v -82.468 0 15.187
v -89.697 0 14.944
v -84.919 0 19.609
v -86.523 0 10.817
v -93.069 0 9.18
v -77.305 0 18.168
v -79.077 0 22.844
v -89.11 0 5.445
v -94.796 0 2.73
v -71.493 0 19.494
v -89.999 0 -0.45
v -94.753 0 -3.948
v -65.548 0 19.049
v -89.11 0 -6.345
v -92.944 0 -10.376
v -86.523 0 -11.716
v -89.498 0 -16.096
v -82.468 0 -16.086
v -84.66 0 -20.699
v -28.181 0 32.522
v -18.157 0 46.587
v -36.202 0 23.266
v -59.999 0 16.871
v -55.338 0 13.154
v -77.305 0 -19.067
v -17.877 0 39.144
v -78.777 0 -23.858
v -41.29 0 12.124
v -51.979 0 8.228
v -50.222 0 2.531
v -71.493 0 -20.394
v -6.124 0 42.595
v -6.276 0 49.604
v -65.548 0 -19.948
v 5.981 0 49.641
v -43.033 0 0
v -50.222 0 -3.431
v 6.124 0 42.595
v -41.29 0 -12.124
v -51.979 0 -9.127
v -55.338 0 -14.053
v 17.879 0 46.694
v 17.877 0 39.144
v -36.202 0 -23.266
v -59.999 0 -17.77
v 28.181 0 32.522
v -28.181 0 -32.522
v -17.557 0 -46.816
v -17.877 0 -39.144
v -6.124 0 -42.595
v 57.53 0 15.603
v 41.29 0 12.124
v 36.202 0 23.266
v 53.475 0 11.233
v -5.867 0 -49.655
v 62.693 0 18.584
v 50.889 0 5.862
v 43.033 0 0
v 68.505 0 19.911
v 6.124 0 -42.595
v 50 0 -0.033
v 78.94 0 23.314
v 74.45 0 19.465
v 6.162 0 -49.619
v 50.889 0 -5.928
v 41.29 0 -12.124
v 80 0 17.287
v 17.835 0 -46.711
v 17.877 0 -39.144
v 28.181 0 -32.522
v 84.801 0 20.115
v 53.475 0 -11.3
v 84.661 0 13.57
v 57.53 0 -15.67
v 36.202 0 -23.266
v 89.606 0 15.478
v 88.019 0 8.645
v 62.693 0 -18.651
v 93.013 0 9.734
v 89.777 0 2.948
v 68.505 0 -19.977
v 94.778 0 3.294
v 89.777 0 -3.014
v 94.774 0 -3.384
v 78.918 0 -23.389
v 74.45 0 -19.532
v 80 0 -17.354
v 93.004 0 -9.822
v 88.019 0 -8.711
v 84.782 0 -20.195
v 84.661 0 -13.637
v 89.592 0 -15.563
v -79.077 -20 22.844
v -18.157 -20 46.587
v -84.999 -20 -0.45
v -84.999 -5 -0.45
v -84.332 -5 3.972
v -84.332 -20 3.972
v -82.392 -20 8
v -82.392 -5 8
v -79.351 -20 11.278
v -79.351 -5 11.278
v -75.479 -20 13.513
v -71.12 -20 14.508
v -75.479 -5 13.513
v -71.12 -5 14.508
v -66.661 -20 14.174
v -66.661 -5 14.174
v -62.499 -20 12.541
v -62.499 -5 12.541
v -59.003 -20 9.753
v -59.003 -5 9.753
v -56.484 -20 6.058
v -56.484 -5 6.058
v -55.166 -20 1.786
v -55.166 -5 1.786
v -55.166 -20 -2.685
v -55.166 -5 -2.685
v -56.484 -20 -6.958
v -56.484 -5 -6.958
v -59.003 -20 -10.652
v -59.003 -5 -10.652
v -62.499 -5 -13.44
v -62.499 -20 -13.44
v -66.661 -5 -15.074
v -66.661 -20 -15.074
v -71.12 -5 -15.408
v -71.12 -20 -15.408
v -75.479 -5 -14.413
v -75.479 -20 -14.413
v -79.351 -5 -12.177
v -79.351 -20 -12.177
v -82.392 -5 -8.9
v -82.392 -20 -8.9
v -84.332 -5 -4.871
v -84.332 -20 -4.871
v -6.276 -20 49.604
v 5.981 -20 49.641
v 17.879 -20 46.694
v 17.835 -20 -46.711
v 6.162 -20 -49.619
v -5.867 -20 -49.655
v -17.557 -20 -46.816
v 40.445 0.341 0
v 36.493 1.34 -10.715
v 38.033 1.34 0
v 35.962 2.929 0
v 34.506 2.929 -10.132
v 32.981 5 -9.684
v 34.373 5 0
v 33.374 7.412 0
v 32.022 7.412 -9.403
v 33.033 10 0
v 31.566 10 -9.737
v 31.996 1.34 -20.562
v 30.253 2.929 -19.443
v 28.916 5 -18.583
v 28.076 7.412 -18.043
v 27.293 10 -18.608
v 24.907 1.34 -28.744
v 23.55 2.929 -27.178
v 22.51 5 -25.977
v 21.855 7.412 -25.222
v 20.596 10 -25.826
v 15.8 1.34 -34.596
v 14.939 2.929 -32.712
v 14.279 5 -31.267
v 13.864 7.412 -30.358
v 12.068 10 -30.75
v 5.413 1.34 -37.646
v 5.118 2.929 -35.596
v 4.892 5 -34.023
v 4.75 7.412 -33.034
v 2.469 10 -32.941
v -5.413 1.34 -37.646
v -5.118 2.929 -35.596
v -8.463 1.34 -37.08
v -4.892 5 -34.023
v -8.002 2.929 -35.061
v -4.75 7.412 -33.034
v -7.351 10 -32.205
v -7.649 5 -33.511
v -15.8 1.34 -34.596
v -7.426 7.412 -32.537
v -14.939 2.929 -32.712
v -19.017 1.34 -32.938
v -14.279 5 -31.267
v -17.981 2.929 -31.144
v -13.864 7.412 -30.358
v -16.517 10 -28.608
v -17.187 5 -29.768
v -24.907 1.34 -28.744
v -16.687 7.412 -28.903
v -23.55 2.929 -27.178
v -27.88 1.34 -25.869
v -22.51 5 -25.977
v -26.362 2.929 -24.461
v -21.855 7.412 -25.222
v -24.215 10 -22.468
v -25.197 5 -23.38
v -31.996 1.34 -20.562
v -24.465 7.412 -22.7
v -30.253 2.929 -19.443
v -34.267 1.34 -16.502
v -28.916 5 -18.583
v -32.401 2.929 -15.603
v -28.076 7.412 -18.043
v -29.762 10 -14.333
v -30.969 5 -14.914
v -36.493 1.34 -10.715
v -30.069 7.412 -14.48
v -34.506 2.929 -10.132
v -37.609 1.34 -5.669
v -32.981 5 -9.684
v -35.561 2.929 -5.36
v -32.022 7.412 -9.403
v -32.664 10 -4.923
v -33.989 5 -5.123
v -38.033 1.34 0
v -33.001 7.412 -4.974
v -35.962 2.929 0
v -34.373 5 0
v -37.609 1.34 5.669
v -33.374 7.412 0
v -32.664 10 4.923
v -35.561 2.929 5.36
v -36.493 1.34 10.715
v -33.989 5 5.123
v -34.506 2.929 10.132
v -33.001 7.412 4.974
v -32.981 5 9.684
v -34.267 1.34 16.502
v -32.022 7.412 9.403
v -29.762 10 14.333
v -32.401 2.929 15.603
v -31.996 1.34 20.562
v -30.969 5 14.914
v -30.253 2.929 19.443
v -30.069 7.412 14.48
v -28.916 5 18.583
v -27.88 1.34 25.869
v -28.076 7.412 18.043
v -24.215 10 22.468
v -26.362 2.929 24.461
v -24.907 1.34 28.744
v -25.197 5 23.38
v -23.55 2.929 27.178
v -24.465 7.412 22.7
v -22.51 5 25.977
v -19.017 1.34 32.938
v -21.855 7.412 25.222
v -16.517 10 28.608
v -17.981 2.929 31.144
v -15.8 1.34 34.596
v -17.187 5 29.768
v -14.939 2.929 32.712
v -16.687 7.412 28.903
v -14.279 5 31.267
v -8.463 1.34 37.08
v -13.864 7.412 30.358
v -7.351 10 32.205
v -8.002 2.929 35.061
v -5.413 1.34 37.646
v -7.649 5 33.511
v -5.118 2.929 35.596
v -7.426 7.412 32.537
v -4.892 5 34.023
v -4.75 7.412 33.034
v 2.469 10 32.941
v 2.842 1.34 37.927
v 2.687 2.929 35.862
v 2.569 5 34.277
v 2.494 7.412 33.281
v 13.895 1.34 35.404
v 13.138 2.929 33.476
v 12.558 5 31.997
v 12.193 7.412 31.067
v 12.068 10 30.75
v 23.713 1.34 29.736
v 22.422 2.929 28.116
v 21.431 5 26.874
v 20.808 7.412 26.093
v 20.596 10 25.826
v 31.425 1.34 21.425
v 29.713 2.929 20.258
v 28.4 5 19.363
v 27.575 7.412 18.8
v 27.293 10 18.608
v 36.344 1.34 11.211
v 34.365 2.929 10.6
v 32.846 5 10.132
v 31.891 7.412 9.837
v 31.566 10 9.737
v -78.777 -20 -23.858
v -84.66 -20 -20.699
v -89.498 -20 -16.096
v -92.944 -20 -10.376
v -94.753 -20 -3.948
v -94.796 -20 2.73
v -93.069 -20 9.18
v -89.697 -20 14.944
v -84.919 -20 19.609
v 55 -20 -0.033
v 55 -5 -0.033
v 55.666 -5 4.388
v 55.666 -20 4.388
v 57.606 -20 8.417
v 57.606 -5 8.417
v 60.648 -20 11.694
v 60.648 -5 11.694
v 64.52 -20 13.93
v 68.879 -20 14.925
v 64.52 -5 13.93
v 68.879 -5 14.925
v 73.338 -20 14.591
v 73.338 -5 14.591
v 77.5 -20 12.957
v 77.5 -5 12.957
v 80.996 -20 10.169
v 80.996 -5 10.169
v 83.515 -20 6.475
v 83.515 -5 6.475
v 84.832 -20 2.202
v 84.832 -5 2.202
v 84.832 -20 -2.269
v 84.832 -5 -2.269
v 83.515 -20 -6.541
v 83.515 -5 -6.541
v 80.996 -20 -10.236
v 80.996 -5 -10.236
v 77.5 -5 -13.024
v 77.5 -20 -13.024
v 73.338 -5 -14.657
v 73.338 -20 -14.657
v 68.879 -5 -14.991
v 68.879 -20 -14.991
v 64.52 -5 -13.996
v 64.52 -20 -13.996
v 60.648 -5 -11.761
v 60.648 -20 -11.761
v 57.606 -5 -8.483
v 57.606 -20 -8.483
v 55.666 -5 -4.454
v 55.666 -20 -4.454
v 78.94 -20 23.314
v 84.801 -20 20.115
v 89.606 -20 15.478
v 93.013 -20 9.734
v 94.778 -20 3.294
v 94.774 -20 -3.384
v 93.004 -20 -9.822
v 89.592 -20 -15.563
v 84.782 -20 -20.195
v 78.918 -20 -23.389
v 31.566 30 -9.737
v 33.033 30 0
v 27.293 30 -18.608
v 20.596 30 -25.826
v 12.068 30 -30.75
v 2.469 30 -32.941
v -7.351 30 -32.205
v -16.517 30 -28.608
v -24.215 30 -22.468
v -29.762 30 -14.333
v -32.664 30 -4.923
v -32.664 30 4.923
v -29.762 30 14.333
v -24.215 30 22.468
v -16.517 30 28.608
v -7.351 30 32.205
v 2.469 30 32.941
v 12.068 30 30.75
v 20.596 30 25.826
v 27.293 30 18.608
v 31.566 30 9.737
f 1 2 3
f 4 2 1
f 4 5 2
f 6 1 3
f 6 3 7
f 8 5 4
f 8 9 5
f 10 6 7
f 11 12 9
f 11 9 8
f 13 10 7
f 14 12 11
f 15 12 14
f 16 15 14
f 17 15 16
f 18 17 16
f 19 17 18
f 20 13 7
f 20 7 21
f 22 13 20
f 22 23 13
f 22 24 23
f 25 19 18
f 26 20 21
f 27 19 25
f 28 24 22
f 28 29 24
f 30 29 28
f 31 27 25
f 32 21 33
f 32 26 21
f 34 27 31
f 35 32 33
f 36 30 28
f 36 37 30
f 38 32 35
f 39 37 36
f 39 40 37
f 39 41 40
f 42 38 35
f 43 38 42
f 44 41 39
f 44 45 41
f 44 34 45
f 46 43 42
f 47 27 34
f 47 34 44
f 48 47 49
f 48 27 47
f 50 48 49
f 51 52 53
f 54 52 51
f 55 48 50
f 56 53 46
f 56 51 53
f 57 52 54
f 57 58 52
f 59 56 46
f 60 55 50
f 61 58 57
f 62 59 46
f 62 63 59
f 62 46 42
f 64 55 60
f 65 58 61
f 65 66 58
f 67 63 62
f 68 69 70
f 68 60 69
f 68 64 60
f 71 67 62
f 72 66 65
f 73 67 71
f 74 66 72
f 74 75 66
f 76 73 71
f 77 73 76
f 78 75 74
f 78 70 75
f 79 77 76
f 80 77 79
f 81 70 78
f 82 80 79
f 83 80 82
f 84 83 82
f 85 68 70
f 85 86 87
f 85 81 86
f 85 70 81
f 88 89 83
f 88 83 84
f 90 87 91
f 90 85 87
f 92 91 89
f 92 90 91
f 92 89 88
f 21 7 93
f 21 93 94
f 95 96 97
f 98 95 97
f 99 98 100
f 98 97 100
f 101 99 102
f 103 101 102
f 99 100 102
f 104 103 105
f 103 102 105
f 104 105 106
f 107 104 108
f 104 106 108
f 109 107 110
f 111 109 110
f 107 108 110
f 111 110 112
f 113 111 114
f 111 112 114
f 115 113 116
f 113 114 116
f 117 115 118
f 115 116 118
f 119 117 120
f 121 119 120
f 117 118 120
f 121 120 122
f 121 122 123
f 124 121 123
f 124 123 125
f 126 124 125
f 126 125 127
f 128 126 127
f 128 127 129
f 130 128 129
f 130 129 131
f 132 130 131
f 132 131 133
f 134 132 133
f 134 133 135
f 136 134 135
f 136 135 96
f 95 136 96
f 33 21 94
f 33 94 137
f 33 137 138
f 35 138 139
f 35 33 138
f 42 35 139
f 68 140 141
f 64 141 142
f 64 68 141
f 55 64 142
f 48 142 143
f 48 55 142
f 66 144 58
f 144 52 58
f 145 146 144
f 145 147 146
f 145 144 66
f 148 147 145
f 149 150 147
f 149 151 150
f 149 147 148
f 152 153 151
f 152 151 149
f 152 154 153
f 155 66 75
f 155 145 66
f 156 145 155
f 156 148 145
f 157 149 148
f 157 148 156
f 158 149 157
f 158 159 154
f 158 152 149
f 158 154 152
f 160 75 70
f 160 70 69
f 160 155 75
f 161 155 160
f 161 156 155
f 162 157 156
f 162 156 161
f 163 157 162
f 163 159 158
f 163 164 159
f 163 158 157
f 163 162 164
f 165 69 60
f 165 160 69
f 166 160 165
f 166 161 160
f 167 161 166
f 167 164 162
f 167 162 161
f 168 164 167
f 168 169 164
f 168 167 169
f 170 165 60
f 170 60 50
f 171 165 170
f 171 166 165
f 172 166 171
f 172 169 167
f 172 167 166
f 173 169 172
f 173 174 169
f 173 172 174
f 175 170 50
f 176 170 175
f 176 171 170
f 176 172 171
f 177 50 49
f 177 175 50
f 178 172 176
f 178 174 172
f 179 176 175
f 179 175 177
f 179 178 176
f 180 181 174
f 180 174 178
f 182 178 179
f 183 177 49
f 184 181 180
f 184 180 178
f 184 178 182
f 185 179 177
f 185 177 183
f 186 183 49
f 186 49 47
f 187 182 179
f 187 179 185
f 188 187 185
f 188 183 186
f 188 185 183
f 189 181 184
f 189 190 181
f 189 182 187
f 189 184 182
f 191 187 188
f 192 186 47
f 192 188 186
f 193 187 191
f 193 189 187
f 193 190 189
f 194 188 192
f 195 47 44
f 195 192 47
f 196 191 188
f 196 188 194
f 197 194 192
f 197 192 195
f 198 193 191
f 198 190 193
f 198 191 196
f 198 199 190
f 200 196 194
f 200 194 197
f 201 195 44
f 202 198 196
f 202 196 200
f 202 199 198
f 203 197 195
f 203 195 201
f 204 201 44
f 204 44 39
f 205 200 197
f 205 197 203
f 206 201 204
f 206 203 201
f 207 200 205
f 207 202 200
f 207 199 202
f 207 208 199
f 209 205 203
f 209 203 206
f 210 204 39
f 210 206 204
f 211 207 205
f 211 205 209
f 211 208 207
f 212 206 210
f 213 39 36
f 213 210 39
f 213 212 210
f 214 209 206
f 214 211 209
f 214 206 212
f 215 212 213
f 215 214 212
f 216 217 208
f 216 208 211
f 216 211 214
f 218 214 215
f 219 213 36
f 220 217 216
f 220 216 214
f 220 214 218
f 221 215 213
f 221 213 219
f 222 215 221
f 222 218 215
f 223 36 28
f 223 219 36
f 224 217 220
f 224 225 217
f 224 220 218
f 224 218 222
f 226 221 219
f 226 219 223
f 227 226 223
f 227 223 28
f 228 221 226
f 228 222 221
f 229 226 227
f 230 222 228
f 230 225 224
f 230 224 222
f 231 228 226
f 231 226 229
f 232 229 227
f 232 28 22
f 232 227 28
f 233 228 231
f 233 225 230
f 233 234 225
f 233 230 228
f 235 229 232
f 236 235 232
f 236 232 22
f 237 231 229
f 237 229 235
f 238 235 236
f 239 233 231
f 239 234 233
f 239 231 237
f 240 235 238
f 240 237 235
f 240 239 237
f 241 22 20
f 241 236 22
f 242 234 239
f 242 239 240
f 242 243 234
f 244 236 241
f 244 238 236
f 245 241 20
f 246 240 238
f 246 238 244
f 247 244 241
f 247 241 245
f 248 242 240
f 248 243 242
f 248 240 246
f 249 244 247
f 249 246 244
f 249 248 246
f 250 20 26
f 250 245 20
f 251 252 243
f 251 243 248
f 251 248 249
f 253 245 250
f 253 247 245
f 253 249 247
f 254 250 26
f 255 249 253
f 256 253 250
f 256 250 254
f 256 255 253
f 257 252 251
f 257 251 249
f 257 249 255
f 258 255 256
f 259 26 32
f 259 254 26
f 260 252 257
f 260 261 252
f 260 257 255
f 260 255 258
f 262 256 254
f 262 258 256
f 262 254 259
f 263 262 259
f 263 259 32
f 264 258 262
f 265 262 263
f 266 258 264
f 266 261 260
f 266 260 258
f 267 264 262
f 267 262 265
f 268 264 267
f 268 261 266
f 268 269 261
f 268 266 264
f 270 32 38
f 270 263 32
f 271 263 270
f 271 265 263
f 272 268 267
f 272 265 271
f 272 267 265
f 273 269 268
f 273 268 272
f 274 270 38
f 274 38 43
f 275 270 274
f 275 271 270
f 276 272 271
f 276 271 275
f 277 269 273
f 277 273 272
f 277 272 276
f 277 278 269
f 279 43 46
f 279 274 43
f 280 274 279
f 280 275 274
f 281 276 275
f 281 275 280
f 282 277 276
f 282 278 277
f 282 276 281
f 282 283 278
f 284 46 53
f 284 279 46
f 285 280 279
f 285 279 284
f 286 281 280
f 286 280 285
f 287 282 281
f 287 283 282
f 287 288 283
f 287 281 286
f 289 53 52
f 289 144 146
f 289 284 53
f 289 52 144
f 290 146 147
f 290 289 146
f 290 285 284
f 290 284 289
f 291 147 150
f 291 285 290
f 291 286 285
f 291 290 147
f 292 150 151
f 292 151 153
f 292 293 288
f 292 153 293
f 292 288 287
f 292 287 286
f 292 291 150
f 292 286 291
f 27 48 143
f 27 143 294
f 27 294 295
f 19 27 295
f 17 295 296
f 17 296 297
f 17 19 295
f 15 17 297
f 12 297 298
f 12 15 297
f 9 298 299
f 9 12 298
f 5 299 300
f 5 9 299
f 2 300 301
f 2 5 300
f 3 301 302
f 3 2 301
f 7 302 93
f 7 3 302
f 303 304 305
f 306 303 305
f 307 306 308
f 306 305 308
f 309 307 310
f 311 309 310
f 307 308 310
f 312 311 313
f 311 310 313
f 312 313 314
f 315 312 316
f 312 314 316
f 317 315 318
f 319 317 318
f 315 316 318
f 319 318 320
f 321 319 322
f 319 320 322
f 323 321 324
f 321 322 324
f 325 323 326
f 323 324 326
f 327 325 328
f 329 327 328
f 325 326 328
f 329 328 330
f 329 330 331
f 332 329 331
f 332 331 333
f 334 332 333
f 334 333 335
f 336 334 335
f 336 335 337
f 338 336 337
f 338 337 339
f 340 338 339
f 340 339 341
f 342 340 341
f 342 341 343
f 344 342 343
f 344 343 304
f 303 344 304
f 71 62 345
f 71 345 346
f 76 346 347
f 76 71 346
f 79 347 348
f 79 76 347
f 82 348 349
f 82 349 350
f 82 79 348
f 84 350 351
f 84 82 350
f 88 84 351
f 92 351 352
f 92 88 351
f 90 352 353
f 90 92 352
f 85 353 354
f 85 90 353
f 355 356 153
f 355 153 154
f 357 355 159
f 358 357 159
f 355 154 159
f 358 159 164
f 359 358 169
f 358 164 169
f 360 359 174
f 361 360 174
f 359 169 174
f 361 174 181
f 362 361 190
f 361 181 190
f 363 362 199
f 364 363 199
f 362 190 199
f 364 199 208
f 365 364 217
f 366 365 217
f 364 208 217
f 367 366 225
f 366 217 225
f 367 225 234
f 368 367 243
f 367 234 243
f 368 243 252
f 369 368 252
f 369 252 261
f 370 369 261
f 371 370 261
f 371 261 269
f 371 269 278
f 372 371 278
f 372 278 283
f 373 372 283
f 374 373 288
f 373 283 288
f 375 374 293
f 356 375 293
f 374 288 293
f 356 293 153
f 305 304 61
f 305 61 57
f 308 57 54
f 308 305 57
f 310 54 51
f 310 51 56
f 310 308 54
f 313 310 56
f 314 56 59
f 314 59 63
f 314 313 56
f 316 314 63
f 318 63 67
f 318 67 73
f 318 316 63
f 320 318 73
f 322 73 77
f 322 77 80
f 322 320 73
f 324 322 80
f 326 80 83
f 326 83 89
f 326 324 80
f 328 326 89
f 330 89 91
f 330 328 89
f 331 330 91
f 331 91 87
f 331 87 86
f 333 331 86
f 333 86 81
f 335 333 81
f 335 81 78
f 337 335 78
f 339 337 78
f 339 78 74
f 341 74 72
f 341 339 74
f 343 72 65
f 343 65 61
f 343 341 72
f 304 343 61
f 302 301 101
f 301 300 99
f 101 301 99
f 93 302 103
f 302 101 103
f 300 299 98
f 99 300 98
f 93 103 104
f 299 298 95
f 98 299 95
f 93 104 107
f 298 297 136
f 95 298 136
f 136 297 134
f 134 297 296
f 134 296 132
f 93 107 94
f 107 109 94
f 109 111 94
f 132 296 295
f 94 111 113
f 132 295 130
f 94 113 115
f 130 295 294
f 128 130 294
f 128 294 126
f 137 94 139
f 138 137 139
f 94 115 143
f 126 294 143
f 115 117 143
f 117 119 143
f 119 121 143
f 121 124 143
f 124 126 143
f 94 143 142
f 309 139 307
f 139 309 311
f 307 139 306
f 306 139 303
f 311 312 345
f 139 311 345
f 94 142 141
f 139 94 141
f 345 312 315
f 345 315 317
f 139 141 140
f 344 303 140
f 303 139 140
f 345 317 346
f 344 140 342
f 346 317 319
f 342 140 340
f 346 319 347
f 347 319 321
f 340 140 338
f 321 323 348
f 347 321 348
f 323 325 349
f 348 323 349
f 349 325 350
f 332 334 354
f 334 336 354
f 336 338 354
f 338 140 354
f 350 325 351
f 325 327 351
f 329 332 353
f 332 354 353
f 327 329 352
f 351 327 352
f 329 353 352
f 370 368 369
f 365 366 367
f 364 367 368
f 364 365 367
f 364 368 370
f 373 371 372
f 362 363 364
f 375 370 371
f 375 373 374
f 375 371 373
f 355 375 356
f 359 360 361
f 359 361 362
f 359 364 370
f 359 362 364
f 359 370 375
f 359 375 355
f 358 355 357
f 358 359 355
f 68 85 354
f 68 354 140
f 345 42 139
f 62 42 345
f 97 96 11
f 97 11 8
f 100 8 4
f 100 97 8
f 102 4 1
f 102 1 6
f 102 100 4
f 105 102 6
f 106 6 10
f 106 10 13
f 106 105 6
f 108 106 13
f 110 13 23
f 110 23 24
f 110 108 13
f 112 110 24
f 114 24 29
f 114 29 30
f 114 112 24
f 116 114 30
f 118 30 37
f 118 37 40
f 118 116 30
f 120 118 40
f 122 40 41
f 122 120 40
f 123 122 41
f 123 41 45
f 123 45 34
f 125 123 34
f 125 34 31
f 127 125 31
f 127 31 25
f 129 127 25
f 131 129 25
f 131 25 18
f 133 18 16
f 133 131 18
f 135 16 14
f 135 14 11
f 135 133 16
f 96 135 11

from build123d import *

# Parameters (mm, degrees)
EXTRUDE_316_DEPTH   = 20
SKETCH_2_R          = 33.033320501
EXTRUDE_1_DEPTH     = 30
SKETCH_3_R          = 15
CUT_EXTRUDE_1_DEPTH = 112.46747736
FILLET_1_R          = 10
CHAMFER_1_SIZE      = 5


with BuildPart() as part:
    # Эскиз1 → Extrude 316 (new body)
    with BuildSketch(Plane(origin=(0, 0, 0), x_dir=(-1, 0, 0), z_dir=(0, -1, 0))):
        with BuildLine():
            Line((-78.917505692, 23.388614652), (-17.835027079, 46.710938859))
            ThreePointArc((-17.835027079, 46.710938859), (-0.148812417, 49.999778548), (17.556665634, 46.816273793))
            Line((17.556665634, 46.816273793), (78.776887546, 23.857954408))
            ThreePointArc((78.776887546, 23.857954408), (94.998038561, 0.610466623), (79.076996078, -22.84357002))
            Line((79.076996078, -22.84357002), (18.156882698, -46.586775062))
            ThreePointArc((18.156882698, -46.586775062), (0.148812417, -49.999778548), (-17.879254632, -46.694028031))
            Line((-17.879254632, -46.694028031), (-78.939619469, -23.313868793))
            ThreePointArc((-78.939619469, -23.313868793), (-94.99998935, 0.044982802), (-78.917505692, 23.388614652))
        make_face()
    extrude(amount=EXTRUDE_316_DEPTH)

    # Эскиз2 → Бобышка-Вытянуть1 (add)
    with BuildSketch(Plane(origin=(0, 0, 0), x_dir=(-1, 0, 0), z_dir=(0, 1, 0))):
        with Locations(Location((0, 0, 0), (0, 0, 180))):
            Circle(SKETCH_2_R)
    extrude(amount=EXTRUDE_1_DEPTH)

    # Эскиз3 → Вырез-Вытянуть1 (cut, through all)
    with BuildSketch(Plane(origin=(0, 0, 0), x_dir=(-1, 0, 0), z_dir=(0, 1, 0))):
        with Locations((-69.999992153, -0.033145222)):
            Circle(SKETCH_3_R)
        with Locations((69.998554729, -0.449817511)):
            Circle(SKETCH_3_R)
    extrude(amount=-CUT_EXTRUDE_1_DEPTH, mode=Mode.SUBTRACT)

    # Скругление1
    fillet_1_edges = [part.edges().sort_by_distance(p)[0] for p in [
        (-33.033320501, 0, 0),
    ]]
    fillet(fillet_1_edges, radius=FILLET_1_R)

    # Фаска1
    chamfer_1_edges = [part.edges().sort_by_distance(p)[0] for p in [
        (84.999992153, 0, -0.033145222),
        (-54.998554729, 0, -0.449817511),
    ]]
    chamfer(chamfer_1_edges, length=CHAMFER_1_SIZE)


solid = part.part
